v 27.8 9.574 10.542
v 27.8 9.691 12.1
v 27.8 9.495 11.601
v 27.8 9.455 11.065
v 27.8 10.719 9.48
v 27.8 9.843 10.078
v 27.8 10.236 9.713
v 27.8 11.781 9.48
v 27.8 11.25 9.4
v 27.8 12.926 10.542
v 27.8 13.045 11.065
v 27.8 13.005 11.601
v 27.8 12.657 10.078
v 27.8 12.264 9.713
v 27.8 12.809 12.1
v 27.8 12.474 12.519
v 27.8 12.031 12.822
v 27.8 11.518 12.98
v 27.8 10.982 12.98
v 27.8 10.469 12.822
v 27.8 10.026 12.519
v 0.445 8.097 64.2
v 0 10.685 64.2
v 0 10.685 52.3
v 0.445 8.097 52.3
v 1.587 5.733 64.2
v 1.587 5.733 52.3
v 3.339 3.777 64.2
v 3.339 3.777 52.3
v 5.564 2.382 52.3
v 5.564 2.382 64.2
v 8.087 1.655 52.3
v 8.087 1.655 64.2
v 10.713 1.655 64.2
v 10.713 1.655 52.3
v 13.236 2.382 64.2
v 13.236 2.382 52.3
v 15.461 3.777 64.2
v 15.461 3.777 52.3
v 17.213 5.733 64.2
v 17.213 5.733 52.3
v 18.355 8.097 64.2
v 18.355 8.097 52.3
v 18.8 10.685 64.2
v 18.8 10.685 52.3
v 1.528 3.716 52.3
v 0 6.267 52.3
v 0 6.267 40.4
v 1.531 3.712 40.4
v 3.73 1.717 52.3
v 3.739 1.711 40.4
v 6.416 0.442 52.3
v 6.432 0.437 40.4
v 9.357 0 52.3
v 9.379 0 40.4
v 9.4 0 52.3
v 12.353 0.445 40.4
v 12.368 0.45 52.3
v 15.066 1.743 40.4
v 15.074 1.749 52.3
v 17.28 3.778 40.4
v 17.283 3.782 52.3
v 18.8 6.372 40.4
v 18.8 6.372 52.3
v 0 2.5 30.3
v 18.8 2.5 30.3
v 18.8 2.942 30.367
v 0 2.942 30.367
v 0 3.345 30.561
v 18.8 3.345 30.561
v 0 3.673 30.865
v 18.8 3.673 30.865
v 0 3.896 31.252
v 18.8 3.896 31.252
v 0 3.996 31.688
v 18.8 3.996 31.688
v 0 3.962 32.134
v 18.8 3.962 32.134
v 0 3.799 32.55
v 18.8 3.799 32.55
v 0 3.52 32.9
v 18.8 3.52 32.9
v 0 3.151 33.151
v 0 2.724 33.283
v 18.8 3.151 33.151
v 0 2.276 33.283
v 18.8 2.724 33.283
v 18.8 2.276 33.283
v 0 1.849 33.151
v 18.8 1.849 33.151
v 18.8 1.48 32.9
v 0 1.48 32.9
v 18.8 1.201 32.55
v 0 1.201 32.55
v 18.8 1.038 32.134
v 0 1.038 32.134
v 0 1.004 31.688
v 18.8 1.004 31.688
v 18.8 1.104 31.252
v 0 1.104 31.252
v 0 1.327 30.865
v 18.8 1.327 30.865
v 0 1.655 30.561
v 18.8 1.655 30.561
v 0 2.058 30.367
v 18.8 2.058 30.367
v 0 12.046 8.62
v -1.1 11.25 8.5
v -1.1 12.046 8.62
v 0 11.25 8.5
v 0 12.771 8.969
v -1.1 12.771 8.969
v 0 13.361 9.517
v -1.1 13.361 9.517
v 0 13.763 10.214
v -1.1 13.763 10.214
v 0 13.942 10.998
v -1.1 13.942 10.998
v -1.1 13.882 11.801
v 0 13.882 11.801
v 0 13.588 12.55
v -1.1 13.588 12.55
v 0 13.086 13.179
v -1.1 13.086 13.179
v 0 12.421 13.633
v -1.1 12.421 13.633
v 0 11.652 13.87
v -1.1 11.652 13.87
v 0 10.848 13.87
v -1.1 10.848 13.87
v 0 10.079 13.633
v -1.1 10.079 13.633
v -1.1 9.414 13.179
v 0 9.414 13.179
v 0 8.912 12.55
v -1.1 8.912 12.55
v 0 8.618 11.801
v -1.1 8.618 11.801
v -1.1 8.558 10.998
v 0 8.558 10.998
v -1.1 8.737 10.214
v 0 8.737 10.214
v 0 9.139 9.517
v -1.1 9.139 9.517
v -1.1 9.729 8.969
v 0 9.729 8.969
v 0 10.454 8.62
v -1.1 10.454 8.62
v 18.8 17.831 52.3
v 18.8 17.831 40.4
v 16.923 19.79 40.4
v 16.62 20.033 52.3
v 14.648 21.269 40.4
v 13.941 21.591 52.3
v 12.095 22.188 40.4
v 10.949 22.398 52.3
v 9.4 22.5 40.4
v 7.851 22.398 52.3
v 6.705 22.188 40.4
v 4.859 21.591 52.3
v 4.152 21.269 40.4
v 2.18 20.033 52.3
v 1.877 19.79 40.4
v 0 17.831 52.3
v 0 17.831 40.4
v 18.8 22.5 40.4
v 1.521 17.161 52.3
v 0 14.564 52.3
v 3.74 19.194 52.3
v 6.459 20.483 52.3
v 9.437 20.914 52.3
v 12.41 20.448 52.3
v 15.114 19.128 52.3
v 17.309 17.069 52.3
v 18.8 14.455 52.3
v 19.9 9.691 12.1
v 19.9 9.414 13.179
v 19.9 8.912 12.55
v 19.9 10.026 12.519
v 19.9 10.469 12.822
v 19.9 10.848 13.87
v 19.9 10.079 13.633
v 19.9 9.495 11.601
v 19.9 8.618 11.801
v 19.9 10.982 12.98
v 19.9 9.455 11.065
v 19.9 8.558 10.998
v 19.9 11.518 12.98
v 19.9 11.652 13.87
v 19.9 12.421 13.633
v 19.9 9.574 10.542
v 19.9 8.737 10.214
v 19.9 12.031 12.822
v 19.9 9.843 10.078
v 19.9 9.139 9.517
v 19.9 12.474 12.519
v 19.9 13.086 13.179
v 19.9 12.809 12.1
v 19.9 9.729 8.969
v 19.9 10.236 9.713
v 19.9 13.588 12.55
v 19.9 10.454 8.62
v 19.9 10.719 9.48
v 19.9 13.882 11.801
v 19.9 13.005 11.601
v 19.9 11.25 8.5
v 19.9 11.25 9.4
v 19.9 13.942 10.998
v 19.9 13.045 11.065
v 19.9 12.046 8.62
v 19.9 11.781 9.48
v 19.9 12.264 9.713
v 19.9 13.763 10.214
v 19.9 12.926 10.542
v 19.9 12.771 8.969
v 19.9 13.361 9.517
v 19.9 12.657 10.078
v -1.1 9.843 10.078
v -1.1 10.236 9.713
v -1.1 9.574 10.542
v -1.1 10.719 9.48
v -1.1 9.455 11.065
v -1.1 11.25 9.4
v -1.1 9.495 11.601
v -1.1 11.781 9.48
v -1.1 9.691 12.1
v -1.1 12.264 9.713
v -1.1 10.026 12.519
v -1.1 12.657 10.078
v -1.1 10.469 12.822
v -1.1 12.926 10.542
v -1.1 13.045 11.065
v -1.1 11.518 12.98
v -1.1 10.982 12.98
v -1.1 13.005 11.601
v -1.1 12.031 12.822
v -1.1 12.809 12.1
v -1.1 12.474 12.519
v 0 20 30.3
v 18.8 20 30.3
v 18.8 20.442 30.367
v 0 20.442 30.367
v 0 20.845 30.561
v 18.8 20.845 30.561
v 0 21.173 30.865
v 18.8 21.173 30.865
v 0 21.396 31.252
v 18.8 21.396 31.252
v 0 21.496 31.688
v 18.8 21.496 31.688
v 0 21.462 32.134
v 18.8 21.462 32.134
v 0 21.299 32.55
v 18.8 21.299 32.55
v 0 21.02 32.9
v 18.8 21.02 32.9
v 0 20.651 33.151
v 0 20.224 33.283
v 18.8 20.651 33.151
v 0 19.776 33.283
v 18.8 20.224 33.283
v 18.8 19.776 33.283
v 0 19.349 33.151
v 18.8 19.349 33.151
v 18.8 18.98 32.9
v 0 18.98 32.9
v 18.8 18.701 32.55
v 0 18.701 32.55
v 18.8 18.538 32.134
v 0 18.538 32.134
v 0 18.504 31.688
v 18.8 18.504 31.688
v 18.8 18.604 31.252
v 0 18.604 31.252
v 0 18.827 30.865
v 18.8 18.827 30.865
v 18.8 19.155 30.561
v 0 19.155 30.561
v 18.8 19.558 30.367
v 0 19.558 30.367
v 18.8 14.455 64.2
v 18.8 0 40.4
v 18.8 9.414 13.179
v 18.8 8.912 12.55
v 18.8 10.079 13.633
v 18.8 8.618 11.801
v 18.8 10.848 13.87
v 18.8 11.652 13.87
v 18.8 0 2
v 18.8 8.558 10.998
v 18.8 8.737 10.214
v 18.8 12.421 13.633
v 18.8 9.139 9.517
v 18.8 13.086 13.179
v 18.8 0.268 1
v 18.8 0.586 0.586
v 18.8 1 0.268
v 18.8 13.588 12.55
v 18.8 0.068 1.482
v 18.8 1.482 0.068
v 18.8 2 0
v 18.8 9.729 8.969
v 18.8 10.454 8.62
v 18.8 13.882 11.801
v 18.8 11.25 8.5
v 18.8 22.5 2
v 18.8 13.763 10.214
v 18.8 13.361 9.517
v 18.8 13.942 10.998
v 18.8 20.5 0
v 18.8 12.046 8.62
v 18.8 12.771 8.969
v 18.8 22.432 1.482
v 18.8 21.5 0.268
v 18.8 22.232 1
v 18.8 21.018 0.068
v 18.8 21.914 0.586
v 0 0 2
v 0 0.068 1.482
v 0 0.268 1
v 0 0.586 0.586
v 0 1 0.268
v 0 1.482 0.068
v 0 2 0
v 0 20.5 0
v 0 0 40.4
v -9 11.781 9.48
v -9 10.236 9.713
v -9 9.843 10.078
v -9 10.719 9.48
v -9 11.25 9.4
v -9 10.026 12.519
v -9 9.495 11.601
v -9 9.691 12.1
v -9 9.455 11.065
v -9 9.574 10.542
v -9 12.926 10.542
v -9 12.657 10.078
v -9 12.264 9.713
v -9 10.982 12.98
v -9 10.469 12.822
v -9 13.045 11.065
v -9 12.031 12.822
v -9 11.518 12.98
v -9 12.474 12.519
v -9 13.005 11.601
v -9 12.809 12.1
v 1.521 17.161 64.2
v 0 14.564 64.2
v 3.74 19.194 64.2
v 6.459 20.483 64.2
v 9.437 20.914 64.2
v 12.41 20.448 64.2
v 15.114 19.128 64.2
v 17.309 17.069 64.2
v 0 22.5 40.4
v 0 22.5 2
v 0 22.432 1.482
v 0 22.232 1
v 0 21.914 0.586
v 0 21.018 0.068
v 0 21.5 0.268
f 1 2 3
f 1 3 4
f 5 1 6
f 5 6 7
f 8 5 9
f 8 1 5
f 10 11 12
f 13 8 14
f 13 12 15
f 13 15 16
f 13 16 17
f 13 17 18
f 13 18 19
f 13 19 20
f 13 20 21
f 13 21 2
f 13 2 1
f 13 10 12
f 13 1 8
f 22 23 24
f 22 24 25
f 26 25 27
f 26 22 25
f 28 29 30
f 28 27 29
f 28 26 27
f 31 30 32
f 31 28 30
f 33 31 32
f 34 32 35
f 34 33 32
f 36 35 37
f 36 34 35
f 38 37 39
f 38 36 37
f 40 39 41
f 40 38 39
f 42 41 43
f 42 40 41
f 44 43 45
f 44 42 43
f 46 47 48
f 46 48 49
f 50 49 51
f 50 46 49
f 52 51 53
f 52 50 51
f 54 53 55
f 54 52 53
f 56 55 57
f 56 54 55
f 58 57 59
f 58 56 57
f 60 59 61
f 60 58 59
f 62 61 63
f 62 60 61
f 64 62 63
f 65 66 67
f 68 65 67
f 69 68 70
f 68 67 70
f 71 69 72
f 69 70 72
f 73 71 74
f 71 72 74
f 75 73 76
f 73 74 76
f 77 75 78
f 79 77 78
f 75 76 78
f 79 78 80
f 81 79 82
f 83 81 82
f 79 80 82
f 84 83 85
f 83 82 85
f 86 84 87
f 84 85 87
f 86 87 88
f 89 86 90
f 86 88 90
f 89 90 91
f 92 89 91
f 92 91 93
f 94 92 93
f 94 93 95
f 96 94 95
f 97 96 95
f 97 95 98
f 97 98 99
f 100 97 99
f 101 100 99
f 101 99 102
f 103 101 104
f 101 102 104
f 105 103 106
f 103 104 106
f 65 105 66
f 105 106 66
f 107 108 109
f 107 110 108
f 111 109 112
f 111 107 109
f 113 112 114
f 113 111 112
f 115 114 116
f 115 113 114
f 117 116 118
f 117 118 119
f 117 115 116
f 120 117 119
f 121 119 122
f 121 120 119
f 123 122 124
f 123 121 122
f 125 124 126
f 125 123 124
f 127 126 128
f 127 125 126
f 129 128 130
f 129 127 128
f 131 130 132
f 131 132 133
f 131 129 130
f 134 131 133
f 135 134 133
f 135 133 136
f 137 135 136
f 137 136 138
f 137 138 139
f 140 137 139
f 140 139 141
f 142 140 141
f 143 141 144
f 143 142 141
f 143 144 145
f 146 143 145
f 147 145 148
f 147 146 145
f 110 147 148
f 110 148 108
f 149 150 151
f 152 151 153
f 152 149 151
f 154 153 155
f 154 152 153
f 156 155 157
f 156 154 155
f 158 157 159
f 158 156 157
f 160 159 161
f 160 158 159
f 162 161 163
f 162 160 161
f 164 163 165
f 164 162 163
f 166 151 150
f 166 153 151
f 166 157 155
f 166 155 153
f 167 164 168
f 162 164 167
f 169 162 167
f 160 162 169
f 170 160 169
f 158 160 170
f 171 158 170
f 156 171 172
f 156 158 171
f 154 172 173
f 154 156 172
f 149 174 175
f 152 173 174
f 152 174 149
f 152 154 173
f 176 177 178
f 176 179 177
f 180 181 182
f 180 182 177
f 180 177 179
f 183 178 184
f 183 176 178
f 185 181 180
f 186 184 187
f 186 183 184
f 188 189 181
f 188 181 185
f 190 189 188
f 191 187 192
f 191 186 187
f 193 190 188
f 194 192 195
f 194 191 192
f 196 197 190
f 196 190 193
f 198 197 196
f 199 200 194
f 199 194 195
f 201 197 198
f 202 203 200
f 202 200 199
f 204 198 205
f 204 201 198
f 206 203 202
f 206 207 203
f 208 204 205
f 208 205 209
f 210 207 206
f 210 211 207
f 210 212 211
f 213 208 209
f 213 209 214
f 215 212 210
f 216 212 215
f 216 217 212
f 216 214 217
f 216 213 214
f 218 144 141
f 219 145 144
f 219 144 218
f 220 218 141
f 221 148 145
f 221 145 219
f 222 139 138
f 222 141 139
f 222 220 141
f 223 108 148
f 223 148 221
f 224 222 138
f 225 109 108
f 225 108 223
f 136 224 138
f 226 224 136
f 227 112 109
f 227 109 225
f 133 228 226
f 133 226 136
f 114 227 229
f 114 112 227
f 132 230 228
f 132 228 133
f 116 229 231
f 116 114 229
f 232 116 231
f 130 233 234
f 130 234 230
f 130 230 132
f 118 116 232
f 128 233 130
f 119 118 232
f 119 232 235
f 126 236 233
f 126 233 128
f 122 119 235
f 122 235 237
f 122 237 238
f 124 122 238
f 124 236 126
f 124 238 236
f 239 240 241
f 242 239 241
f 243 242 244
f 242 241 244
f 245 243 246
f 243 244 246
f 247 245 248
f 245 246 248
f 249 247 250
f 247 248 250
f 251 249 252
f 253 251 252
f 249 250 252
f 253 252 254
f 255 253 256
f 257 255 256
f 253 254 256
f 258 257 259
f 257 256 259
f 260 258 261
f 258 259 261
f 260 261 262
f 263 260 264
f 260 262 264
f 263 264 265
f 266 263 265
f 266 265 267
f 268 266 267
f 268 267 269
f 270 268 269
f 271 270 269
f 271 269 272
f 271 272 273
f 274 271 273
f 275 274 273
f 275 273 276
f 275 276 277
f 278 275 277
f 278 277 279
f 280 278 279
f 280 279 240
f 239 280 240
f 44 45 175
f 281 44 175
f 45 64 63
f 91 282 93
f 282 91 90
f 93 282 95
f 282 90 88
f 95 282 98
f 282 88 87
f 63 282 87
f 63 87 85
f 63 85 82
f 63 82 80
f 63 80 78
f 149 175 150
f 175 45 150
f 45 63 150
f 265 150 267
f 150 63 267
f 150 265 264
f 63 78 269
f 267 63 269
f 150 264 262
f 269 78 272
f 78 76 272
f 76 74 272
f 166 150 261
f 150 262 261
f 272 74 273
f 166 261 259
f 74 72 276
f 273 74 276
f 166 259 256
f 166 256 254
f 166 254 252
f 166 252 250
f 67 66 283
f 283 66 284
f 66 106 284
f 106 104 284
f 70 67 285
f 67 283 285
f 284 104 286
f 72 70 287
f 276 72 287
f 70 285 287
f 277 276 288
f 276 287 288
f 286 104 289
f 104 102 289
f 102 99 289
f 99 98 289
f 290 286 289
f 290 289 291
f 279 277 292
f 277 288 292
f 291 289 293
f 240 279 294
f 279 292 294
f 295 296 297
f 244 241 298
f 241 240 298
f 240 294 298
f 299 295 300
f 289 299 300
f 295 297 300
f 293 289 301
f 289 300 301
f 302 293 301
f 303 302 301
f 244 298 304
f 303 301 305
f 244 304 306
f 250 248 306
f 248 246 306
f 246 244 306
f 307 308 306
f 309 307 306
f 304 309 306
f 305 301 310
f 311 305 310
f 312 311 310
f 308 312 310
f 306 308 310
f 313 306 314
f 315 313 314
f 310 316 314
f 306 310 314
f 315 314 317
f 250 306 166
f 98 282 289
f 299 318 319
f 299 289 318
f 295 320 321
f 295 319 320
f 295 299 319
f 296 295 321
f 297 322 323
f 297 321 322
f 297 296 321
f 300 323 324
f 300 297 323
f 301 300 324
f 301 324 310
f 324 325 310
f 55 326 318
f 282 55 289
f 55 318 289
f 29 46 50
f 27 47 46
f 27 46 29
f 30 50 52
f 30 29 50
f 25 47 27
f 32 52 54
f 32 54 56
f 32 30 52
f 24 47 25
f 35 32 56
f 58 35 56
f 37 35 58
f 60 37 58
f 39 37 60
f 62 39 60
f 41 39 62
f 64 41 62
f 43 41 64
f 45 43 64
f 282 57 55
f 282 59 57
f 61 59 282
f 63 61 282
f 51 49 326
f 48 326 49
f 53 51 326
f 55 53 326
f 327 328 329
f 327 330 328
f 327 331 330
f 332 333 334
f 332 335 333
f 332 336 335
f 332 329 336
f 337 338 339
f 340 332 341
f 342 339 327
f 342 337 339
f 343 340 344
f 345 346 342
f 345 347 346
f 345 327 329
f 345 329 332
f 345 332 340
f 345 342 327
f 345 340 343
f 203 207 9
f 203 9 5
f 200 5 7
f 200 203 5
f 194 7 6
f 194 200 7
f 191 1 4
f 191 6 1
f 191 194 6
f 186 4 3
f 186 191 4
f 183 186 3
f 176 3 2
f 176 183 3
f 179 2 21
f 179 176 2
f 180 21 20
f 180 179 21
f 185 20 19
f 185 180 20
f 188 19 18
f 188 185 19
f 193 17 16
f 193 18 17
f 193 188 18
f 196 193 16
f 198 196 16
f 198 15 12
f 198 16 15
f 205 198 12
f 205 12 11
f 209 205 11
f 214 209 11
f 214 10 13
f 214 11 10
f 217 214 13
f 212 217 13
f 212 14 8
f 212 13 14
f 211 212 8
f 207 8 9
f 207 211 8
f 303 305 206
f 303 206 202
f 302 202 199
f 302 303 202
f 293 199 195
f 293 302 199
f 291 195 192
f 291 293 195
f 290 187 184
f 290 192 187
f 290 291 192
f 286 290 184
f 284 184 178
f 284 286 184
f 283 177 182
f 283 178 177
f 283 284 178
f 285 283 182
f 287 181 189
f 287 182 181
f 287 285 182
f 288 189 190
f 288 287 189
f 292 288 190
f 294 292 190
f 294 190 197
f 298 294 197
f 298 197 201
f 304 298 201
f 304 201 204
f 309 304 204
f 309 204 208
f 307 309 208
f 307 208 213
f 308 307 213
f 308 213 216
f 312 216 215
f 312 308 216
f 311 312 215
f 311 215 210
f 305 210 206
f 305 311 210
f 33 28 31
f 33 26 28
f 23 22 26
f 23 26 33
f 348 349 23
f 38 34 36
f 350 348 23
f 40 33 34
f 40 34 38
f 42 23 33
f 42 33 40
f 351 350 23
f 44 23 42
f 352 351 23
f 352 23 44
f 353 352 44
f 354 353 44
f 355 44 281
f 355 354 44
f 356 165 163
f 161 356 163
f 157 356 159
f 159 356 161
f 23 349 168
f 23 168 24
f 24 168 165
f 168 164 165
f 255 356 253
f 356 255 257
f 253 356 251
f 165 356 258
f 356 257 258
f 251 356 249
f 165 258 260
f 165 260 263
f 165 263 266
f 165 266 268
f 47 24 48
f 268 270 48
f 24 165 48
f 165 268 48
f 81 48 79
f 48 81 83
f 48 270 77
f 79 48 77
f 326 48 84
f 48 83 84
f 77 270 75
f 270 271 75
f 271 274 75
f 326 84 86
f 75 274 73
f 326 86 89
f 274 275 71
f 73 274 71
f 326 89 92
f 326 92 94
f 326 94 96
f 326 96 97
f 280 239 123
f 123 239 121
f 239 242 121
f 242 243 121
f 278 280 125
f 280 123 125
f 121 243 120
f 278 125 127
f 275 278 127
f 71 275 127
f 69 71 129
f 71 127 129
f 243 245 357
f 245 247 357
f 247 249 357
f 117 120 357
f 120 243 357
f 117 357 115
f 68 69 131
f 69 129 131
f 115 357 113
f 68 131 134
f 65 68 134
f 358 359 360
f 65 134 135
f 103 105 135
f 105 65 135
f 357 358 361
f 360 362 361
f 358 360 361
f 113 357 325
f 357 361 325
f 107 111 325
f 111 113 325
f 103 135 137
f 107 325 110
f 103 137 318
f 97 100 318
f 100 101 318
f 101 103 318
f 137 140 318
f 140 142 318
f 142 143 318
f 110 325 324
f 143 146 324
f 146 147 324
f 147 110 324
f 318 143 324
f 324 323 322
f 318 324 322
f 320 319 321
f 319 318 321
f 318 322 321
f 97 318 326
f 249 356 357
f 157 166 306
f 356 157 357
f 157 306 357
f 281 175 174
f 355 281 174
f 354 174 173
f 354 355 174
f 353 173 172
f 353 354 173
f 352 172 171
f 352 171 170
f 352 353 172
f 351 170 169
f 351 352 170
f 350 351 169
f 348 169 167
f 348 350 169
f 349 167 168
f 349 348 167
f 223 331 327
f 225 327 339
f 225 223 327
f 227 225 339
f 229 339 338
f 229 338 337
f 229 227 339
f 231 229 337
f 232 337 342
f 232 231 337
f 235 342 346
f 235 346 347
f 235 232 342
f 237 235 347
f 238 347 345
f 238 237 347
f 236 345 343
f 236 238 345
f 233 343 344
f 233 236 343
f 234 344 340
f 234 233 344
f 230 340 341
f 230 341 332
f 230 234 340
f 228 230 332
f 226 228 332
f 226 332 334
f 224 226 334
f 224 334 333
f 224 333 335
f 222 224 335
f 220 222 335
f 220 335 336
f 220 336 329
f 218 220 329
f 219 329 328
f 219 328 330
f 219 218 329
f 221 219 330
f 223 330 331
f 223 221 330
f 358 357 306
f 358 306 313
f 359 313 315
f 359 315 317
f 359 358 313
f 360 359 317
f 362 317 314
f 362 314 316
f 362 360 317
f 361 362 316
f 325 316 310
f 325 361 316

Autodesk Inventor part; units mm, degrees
ref_plane "YZ Plane" through (0, 0, 0) normal (1, 0, 0) x (0, 1, 0)
ref_plane "XZ Plane" through (0, 0, 0) normal (0, 1, 0) x (-1, 0, 0)
sketch "Esboço1" plane through (0, 0, 0) normal (0, 0, 1) x (1, 0, 0)
  line L0 (0, 0) -> (18.8, 0)
  line L1 (18.8, 0) -> (18.8, 22.5)
  line L2 (18.8, 22.5) -> (0, 22.5)
  line L3 (0, 22.5) -> (0, 0)
  dimension "d0" = 18.8
  dimension "d1" = 22.5
extrude "Extrusão1" add sketch "Esboço1" along normal blind 64.2
sketch "Esboço2" plane through (18.8, 0, 0) normal (1, 0, 0) x (0, 0, -1)
  line L0 (0, 0) -> (-64.2, 0) projected
  line L1 (0, 0) -> (0, 11.25)
  line L2 (0, 0) -> (0, 22.5) projected
  line L3 (0, 11.25) -> (-11.2, 11.25)
  circle A0 centre (-11.2, 11.25) radius 2.7
  dimension "d4" = 11.25
  dimension "d5" = 11.2
  dimension "d6" = 5.4
extrude "Extrusão2" add sketch "Esboço2" along normal blind 1.1
sketch "Esboço3" plane through (19.9, 11.25, 11.2) normal (1, 0, 0) x (0, 0, -1)
  circle A0 centre (0, 0) radius 1.8
  point P0 (11.2, -11.25)
  dimension "d9" = 3.6
extrude "Extrusão3" add sketch "Esboço3" along normal blind 7.9
ref_plane "Plano de trabalho1" through (9.4, 0, 0) normal (1, 0, 0) x (0, 0, -1)
mirror "Espelhamento1" about plane through (9.4, 0, 0) normal (1, 0, 0) of "Extrusão3", "Extrusão2"
fillet "Arredondamento1" radius 2 1 edges at (9.4, 22.5, 0)
fillet "Arredondamento2" radius 2 1 edges at (9.4, 0, 0)
sketch "Esboço4" plane through (18.8, 0, 64.2) normal (1, 0, 0) x (0, 0, -1)
  line L0 (64.2, 0) -> (32.4, 0)
  line L1 (62.2, 0) -> (0, 0) projected
  line L2 (32.4, 0) -> (32.4, 2.5)
  circle A0 centre (32.4, 2.5) radius 1.5
  line L3 (32.4, 2.5) -> (32.4, 20)
  circle A1 centre (32.4, 20) radius 1.5
  dimension "d15" = 31.8
  dimension "d16" = 2.5
  dimension "d17" = 3
  dimension "d18" = 17.5
  dimension "d19" = 3
extrude "Extrusão4" cut sketch "Esboço4" against normal through all
sketch "Esboço5" plane through (0, 0, 64.2) normal (0, 0, 1) x (1, 0, 0)
  line L0 (18.8, 22.5) -> (0, 22.5)
  line L1 (0, 22.5) -> (18.8, 22.5)
  line L2 (18.8, 22.5) -> (18.8, 0)
  line L3 (18.8, 0) -> (0, 0)
  line L4 (0, 0) -> (0, 22.5)
  arc A0 (18.8, 17.831338) -> (0, 17.831338) centre (9.4, 10.702573) ccw
  point P0 (9.4, 22.5)
extrude "Extrusão5" cut sketch "Esboço5" against normal blind 23.8 contours L2 A0 L0 | A0 L4 L0
sketch "Esboço6" plane through (0, 0, 64.2) normal (0, 0, 1) x (1, 0, 0)
  line L0 (0, 22.508504) -> (18.8, 22.508504)
  line L1 (18.8, 22.508504) -> (18.8, 0)
  line L2 (18.8, 0) -> (0, 0)
  line L3 (0, 0) -> (0, 22.508504)
  arc A0 (0, 6.267075) -> (18.8, 6.372369) centre (9.378542, 10.150894) ccw
  point P0 (9.357085, 0)
  point P1 (9.4, 0)
extrude "Extrusão6" cut sketch "Esboço6" against normal blind 23.8 contours A0 L2 L3 | L1 L2 A0
sketch "Esboço7" plane through (0, 0, 64.2) normal (0, 0, 1) x (1, 0, 0)
  line L0 (0, 22.5) -> (9.4, 22.5)
  line L1 (0, 22.5) -> (18.8, 22.5)
  line L2 (18.8, 22.5) -> (18.8, 0)
  line L3 (18.8, 0) -> (0, 0)
  line L4 (0, 0) -> (0, 22.5)
  arc A0 (18.8, 14.455208) -> (0, 14.564328) centre (9.378542, 10.812909) ccw
extrude "Extrusão7" cut sketch "Esboço7" against normal blind 11.9 contours L0 L1 L2 A0 L4
sketch "Esboço9" plane through (0, 0, 64.2) normal (0, 0, 1) x (1, 0, 0)
  line L0 (0, 20.5) -> (0, 2)
  line L1 (18.8, 13.95) -> (18.8, 8.55)
  arc A0 (0, 11.25) -> (18.8, 11.25) centre (9.4, 10.967634) ccw
  line L2 (0, 20.5) -> (0, 22.5)
  line L3 (0, 22.5) -> (18.8, 22.5)
  line L4 (18.8, 22.5) -> (18.8, 0)
  line L5 (18.8, 0) -> (0, 0)
  line L6 (0, 0) -> (0, 22.5)
  point P0 (18.8, 10.685268)
  point P1 (0, 10.685268)
sketch "Esboço9 outline for Extrusão8" plane through (0, 0, 64.2) normal (0, 0, 1) x (1, 0, 0)
  line L0 (0, 0) -> (18.8, 0)
  line L1 (0, 2) -> (0, 0)
  line L2 (0, 10.685268) -> (0, 2)
  arc A0 (18.8, 10.685268) -> (0, 10.685268) centre (9.4, 10.967634) cw
  line L3 (18.8, 8.55) -> (18.8, 10.685268)
  line L4 (18.8, 0) -> (18.8, 8.55)
extrude "Extrusão8" cut sketch "Esboço9 outline for Extrusão8" against normal blind 11.9
properties part number "motorDC"
